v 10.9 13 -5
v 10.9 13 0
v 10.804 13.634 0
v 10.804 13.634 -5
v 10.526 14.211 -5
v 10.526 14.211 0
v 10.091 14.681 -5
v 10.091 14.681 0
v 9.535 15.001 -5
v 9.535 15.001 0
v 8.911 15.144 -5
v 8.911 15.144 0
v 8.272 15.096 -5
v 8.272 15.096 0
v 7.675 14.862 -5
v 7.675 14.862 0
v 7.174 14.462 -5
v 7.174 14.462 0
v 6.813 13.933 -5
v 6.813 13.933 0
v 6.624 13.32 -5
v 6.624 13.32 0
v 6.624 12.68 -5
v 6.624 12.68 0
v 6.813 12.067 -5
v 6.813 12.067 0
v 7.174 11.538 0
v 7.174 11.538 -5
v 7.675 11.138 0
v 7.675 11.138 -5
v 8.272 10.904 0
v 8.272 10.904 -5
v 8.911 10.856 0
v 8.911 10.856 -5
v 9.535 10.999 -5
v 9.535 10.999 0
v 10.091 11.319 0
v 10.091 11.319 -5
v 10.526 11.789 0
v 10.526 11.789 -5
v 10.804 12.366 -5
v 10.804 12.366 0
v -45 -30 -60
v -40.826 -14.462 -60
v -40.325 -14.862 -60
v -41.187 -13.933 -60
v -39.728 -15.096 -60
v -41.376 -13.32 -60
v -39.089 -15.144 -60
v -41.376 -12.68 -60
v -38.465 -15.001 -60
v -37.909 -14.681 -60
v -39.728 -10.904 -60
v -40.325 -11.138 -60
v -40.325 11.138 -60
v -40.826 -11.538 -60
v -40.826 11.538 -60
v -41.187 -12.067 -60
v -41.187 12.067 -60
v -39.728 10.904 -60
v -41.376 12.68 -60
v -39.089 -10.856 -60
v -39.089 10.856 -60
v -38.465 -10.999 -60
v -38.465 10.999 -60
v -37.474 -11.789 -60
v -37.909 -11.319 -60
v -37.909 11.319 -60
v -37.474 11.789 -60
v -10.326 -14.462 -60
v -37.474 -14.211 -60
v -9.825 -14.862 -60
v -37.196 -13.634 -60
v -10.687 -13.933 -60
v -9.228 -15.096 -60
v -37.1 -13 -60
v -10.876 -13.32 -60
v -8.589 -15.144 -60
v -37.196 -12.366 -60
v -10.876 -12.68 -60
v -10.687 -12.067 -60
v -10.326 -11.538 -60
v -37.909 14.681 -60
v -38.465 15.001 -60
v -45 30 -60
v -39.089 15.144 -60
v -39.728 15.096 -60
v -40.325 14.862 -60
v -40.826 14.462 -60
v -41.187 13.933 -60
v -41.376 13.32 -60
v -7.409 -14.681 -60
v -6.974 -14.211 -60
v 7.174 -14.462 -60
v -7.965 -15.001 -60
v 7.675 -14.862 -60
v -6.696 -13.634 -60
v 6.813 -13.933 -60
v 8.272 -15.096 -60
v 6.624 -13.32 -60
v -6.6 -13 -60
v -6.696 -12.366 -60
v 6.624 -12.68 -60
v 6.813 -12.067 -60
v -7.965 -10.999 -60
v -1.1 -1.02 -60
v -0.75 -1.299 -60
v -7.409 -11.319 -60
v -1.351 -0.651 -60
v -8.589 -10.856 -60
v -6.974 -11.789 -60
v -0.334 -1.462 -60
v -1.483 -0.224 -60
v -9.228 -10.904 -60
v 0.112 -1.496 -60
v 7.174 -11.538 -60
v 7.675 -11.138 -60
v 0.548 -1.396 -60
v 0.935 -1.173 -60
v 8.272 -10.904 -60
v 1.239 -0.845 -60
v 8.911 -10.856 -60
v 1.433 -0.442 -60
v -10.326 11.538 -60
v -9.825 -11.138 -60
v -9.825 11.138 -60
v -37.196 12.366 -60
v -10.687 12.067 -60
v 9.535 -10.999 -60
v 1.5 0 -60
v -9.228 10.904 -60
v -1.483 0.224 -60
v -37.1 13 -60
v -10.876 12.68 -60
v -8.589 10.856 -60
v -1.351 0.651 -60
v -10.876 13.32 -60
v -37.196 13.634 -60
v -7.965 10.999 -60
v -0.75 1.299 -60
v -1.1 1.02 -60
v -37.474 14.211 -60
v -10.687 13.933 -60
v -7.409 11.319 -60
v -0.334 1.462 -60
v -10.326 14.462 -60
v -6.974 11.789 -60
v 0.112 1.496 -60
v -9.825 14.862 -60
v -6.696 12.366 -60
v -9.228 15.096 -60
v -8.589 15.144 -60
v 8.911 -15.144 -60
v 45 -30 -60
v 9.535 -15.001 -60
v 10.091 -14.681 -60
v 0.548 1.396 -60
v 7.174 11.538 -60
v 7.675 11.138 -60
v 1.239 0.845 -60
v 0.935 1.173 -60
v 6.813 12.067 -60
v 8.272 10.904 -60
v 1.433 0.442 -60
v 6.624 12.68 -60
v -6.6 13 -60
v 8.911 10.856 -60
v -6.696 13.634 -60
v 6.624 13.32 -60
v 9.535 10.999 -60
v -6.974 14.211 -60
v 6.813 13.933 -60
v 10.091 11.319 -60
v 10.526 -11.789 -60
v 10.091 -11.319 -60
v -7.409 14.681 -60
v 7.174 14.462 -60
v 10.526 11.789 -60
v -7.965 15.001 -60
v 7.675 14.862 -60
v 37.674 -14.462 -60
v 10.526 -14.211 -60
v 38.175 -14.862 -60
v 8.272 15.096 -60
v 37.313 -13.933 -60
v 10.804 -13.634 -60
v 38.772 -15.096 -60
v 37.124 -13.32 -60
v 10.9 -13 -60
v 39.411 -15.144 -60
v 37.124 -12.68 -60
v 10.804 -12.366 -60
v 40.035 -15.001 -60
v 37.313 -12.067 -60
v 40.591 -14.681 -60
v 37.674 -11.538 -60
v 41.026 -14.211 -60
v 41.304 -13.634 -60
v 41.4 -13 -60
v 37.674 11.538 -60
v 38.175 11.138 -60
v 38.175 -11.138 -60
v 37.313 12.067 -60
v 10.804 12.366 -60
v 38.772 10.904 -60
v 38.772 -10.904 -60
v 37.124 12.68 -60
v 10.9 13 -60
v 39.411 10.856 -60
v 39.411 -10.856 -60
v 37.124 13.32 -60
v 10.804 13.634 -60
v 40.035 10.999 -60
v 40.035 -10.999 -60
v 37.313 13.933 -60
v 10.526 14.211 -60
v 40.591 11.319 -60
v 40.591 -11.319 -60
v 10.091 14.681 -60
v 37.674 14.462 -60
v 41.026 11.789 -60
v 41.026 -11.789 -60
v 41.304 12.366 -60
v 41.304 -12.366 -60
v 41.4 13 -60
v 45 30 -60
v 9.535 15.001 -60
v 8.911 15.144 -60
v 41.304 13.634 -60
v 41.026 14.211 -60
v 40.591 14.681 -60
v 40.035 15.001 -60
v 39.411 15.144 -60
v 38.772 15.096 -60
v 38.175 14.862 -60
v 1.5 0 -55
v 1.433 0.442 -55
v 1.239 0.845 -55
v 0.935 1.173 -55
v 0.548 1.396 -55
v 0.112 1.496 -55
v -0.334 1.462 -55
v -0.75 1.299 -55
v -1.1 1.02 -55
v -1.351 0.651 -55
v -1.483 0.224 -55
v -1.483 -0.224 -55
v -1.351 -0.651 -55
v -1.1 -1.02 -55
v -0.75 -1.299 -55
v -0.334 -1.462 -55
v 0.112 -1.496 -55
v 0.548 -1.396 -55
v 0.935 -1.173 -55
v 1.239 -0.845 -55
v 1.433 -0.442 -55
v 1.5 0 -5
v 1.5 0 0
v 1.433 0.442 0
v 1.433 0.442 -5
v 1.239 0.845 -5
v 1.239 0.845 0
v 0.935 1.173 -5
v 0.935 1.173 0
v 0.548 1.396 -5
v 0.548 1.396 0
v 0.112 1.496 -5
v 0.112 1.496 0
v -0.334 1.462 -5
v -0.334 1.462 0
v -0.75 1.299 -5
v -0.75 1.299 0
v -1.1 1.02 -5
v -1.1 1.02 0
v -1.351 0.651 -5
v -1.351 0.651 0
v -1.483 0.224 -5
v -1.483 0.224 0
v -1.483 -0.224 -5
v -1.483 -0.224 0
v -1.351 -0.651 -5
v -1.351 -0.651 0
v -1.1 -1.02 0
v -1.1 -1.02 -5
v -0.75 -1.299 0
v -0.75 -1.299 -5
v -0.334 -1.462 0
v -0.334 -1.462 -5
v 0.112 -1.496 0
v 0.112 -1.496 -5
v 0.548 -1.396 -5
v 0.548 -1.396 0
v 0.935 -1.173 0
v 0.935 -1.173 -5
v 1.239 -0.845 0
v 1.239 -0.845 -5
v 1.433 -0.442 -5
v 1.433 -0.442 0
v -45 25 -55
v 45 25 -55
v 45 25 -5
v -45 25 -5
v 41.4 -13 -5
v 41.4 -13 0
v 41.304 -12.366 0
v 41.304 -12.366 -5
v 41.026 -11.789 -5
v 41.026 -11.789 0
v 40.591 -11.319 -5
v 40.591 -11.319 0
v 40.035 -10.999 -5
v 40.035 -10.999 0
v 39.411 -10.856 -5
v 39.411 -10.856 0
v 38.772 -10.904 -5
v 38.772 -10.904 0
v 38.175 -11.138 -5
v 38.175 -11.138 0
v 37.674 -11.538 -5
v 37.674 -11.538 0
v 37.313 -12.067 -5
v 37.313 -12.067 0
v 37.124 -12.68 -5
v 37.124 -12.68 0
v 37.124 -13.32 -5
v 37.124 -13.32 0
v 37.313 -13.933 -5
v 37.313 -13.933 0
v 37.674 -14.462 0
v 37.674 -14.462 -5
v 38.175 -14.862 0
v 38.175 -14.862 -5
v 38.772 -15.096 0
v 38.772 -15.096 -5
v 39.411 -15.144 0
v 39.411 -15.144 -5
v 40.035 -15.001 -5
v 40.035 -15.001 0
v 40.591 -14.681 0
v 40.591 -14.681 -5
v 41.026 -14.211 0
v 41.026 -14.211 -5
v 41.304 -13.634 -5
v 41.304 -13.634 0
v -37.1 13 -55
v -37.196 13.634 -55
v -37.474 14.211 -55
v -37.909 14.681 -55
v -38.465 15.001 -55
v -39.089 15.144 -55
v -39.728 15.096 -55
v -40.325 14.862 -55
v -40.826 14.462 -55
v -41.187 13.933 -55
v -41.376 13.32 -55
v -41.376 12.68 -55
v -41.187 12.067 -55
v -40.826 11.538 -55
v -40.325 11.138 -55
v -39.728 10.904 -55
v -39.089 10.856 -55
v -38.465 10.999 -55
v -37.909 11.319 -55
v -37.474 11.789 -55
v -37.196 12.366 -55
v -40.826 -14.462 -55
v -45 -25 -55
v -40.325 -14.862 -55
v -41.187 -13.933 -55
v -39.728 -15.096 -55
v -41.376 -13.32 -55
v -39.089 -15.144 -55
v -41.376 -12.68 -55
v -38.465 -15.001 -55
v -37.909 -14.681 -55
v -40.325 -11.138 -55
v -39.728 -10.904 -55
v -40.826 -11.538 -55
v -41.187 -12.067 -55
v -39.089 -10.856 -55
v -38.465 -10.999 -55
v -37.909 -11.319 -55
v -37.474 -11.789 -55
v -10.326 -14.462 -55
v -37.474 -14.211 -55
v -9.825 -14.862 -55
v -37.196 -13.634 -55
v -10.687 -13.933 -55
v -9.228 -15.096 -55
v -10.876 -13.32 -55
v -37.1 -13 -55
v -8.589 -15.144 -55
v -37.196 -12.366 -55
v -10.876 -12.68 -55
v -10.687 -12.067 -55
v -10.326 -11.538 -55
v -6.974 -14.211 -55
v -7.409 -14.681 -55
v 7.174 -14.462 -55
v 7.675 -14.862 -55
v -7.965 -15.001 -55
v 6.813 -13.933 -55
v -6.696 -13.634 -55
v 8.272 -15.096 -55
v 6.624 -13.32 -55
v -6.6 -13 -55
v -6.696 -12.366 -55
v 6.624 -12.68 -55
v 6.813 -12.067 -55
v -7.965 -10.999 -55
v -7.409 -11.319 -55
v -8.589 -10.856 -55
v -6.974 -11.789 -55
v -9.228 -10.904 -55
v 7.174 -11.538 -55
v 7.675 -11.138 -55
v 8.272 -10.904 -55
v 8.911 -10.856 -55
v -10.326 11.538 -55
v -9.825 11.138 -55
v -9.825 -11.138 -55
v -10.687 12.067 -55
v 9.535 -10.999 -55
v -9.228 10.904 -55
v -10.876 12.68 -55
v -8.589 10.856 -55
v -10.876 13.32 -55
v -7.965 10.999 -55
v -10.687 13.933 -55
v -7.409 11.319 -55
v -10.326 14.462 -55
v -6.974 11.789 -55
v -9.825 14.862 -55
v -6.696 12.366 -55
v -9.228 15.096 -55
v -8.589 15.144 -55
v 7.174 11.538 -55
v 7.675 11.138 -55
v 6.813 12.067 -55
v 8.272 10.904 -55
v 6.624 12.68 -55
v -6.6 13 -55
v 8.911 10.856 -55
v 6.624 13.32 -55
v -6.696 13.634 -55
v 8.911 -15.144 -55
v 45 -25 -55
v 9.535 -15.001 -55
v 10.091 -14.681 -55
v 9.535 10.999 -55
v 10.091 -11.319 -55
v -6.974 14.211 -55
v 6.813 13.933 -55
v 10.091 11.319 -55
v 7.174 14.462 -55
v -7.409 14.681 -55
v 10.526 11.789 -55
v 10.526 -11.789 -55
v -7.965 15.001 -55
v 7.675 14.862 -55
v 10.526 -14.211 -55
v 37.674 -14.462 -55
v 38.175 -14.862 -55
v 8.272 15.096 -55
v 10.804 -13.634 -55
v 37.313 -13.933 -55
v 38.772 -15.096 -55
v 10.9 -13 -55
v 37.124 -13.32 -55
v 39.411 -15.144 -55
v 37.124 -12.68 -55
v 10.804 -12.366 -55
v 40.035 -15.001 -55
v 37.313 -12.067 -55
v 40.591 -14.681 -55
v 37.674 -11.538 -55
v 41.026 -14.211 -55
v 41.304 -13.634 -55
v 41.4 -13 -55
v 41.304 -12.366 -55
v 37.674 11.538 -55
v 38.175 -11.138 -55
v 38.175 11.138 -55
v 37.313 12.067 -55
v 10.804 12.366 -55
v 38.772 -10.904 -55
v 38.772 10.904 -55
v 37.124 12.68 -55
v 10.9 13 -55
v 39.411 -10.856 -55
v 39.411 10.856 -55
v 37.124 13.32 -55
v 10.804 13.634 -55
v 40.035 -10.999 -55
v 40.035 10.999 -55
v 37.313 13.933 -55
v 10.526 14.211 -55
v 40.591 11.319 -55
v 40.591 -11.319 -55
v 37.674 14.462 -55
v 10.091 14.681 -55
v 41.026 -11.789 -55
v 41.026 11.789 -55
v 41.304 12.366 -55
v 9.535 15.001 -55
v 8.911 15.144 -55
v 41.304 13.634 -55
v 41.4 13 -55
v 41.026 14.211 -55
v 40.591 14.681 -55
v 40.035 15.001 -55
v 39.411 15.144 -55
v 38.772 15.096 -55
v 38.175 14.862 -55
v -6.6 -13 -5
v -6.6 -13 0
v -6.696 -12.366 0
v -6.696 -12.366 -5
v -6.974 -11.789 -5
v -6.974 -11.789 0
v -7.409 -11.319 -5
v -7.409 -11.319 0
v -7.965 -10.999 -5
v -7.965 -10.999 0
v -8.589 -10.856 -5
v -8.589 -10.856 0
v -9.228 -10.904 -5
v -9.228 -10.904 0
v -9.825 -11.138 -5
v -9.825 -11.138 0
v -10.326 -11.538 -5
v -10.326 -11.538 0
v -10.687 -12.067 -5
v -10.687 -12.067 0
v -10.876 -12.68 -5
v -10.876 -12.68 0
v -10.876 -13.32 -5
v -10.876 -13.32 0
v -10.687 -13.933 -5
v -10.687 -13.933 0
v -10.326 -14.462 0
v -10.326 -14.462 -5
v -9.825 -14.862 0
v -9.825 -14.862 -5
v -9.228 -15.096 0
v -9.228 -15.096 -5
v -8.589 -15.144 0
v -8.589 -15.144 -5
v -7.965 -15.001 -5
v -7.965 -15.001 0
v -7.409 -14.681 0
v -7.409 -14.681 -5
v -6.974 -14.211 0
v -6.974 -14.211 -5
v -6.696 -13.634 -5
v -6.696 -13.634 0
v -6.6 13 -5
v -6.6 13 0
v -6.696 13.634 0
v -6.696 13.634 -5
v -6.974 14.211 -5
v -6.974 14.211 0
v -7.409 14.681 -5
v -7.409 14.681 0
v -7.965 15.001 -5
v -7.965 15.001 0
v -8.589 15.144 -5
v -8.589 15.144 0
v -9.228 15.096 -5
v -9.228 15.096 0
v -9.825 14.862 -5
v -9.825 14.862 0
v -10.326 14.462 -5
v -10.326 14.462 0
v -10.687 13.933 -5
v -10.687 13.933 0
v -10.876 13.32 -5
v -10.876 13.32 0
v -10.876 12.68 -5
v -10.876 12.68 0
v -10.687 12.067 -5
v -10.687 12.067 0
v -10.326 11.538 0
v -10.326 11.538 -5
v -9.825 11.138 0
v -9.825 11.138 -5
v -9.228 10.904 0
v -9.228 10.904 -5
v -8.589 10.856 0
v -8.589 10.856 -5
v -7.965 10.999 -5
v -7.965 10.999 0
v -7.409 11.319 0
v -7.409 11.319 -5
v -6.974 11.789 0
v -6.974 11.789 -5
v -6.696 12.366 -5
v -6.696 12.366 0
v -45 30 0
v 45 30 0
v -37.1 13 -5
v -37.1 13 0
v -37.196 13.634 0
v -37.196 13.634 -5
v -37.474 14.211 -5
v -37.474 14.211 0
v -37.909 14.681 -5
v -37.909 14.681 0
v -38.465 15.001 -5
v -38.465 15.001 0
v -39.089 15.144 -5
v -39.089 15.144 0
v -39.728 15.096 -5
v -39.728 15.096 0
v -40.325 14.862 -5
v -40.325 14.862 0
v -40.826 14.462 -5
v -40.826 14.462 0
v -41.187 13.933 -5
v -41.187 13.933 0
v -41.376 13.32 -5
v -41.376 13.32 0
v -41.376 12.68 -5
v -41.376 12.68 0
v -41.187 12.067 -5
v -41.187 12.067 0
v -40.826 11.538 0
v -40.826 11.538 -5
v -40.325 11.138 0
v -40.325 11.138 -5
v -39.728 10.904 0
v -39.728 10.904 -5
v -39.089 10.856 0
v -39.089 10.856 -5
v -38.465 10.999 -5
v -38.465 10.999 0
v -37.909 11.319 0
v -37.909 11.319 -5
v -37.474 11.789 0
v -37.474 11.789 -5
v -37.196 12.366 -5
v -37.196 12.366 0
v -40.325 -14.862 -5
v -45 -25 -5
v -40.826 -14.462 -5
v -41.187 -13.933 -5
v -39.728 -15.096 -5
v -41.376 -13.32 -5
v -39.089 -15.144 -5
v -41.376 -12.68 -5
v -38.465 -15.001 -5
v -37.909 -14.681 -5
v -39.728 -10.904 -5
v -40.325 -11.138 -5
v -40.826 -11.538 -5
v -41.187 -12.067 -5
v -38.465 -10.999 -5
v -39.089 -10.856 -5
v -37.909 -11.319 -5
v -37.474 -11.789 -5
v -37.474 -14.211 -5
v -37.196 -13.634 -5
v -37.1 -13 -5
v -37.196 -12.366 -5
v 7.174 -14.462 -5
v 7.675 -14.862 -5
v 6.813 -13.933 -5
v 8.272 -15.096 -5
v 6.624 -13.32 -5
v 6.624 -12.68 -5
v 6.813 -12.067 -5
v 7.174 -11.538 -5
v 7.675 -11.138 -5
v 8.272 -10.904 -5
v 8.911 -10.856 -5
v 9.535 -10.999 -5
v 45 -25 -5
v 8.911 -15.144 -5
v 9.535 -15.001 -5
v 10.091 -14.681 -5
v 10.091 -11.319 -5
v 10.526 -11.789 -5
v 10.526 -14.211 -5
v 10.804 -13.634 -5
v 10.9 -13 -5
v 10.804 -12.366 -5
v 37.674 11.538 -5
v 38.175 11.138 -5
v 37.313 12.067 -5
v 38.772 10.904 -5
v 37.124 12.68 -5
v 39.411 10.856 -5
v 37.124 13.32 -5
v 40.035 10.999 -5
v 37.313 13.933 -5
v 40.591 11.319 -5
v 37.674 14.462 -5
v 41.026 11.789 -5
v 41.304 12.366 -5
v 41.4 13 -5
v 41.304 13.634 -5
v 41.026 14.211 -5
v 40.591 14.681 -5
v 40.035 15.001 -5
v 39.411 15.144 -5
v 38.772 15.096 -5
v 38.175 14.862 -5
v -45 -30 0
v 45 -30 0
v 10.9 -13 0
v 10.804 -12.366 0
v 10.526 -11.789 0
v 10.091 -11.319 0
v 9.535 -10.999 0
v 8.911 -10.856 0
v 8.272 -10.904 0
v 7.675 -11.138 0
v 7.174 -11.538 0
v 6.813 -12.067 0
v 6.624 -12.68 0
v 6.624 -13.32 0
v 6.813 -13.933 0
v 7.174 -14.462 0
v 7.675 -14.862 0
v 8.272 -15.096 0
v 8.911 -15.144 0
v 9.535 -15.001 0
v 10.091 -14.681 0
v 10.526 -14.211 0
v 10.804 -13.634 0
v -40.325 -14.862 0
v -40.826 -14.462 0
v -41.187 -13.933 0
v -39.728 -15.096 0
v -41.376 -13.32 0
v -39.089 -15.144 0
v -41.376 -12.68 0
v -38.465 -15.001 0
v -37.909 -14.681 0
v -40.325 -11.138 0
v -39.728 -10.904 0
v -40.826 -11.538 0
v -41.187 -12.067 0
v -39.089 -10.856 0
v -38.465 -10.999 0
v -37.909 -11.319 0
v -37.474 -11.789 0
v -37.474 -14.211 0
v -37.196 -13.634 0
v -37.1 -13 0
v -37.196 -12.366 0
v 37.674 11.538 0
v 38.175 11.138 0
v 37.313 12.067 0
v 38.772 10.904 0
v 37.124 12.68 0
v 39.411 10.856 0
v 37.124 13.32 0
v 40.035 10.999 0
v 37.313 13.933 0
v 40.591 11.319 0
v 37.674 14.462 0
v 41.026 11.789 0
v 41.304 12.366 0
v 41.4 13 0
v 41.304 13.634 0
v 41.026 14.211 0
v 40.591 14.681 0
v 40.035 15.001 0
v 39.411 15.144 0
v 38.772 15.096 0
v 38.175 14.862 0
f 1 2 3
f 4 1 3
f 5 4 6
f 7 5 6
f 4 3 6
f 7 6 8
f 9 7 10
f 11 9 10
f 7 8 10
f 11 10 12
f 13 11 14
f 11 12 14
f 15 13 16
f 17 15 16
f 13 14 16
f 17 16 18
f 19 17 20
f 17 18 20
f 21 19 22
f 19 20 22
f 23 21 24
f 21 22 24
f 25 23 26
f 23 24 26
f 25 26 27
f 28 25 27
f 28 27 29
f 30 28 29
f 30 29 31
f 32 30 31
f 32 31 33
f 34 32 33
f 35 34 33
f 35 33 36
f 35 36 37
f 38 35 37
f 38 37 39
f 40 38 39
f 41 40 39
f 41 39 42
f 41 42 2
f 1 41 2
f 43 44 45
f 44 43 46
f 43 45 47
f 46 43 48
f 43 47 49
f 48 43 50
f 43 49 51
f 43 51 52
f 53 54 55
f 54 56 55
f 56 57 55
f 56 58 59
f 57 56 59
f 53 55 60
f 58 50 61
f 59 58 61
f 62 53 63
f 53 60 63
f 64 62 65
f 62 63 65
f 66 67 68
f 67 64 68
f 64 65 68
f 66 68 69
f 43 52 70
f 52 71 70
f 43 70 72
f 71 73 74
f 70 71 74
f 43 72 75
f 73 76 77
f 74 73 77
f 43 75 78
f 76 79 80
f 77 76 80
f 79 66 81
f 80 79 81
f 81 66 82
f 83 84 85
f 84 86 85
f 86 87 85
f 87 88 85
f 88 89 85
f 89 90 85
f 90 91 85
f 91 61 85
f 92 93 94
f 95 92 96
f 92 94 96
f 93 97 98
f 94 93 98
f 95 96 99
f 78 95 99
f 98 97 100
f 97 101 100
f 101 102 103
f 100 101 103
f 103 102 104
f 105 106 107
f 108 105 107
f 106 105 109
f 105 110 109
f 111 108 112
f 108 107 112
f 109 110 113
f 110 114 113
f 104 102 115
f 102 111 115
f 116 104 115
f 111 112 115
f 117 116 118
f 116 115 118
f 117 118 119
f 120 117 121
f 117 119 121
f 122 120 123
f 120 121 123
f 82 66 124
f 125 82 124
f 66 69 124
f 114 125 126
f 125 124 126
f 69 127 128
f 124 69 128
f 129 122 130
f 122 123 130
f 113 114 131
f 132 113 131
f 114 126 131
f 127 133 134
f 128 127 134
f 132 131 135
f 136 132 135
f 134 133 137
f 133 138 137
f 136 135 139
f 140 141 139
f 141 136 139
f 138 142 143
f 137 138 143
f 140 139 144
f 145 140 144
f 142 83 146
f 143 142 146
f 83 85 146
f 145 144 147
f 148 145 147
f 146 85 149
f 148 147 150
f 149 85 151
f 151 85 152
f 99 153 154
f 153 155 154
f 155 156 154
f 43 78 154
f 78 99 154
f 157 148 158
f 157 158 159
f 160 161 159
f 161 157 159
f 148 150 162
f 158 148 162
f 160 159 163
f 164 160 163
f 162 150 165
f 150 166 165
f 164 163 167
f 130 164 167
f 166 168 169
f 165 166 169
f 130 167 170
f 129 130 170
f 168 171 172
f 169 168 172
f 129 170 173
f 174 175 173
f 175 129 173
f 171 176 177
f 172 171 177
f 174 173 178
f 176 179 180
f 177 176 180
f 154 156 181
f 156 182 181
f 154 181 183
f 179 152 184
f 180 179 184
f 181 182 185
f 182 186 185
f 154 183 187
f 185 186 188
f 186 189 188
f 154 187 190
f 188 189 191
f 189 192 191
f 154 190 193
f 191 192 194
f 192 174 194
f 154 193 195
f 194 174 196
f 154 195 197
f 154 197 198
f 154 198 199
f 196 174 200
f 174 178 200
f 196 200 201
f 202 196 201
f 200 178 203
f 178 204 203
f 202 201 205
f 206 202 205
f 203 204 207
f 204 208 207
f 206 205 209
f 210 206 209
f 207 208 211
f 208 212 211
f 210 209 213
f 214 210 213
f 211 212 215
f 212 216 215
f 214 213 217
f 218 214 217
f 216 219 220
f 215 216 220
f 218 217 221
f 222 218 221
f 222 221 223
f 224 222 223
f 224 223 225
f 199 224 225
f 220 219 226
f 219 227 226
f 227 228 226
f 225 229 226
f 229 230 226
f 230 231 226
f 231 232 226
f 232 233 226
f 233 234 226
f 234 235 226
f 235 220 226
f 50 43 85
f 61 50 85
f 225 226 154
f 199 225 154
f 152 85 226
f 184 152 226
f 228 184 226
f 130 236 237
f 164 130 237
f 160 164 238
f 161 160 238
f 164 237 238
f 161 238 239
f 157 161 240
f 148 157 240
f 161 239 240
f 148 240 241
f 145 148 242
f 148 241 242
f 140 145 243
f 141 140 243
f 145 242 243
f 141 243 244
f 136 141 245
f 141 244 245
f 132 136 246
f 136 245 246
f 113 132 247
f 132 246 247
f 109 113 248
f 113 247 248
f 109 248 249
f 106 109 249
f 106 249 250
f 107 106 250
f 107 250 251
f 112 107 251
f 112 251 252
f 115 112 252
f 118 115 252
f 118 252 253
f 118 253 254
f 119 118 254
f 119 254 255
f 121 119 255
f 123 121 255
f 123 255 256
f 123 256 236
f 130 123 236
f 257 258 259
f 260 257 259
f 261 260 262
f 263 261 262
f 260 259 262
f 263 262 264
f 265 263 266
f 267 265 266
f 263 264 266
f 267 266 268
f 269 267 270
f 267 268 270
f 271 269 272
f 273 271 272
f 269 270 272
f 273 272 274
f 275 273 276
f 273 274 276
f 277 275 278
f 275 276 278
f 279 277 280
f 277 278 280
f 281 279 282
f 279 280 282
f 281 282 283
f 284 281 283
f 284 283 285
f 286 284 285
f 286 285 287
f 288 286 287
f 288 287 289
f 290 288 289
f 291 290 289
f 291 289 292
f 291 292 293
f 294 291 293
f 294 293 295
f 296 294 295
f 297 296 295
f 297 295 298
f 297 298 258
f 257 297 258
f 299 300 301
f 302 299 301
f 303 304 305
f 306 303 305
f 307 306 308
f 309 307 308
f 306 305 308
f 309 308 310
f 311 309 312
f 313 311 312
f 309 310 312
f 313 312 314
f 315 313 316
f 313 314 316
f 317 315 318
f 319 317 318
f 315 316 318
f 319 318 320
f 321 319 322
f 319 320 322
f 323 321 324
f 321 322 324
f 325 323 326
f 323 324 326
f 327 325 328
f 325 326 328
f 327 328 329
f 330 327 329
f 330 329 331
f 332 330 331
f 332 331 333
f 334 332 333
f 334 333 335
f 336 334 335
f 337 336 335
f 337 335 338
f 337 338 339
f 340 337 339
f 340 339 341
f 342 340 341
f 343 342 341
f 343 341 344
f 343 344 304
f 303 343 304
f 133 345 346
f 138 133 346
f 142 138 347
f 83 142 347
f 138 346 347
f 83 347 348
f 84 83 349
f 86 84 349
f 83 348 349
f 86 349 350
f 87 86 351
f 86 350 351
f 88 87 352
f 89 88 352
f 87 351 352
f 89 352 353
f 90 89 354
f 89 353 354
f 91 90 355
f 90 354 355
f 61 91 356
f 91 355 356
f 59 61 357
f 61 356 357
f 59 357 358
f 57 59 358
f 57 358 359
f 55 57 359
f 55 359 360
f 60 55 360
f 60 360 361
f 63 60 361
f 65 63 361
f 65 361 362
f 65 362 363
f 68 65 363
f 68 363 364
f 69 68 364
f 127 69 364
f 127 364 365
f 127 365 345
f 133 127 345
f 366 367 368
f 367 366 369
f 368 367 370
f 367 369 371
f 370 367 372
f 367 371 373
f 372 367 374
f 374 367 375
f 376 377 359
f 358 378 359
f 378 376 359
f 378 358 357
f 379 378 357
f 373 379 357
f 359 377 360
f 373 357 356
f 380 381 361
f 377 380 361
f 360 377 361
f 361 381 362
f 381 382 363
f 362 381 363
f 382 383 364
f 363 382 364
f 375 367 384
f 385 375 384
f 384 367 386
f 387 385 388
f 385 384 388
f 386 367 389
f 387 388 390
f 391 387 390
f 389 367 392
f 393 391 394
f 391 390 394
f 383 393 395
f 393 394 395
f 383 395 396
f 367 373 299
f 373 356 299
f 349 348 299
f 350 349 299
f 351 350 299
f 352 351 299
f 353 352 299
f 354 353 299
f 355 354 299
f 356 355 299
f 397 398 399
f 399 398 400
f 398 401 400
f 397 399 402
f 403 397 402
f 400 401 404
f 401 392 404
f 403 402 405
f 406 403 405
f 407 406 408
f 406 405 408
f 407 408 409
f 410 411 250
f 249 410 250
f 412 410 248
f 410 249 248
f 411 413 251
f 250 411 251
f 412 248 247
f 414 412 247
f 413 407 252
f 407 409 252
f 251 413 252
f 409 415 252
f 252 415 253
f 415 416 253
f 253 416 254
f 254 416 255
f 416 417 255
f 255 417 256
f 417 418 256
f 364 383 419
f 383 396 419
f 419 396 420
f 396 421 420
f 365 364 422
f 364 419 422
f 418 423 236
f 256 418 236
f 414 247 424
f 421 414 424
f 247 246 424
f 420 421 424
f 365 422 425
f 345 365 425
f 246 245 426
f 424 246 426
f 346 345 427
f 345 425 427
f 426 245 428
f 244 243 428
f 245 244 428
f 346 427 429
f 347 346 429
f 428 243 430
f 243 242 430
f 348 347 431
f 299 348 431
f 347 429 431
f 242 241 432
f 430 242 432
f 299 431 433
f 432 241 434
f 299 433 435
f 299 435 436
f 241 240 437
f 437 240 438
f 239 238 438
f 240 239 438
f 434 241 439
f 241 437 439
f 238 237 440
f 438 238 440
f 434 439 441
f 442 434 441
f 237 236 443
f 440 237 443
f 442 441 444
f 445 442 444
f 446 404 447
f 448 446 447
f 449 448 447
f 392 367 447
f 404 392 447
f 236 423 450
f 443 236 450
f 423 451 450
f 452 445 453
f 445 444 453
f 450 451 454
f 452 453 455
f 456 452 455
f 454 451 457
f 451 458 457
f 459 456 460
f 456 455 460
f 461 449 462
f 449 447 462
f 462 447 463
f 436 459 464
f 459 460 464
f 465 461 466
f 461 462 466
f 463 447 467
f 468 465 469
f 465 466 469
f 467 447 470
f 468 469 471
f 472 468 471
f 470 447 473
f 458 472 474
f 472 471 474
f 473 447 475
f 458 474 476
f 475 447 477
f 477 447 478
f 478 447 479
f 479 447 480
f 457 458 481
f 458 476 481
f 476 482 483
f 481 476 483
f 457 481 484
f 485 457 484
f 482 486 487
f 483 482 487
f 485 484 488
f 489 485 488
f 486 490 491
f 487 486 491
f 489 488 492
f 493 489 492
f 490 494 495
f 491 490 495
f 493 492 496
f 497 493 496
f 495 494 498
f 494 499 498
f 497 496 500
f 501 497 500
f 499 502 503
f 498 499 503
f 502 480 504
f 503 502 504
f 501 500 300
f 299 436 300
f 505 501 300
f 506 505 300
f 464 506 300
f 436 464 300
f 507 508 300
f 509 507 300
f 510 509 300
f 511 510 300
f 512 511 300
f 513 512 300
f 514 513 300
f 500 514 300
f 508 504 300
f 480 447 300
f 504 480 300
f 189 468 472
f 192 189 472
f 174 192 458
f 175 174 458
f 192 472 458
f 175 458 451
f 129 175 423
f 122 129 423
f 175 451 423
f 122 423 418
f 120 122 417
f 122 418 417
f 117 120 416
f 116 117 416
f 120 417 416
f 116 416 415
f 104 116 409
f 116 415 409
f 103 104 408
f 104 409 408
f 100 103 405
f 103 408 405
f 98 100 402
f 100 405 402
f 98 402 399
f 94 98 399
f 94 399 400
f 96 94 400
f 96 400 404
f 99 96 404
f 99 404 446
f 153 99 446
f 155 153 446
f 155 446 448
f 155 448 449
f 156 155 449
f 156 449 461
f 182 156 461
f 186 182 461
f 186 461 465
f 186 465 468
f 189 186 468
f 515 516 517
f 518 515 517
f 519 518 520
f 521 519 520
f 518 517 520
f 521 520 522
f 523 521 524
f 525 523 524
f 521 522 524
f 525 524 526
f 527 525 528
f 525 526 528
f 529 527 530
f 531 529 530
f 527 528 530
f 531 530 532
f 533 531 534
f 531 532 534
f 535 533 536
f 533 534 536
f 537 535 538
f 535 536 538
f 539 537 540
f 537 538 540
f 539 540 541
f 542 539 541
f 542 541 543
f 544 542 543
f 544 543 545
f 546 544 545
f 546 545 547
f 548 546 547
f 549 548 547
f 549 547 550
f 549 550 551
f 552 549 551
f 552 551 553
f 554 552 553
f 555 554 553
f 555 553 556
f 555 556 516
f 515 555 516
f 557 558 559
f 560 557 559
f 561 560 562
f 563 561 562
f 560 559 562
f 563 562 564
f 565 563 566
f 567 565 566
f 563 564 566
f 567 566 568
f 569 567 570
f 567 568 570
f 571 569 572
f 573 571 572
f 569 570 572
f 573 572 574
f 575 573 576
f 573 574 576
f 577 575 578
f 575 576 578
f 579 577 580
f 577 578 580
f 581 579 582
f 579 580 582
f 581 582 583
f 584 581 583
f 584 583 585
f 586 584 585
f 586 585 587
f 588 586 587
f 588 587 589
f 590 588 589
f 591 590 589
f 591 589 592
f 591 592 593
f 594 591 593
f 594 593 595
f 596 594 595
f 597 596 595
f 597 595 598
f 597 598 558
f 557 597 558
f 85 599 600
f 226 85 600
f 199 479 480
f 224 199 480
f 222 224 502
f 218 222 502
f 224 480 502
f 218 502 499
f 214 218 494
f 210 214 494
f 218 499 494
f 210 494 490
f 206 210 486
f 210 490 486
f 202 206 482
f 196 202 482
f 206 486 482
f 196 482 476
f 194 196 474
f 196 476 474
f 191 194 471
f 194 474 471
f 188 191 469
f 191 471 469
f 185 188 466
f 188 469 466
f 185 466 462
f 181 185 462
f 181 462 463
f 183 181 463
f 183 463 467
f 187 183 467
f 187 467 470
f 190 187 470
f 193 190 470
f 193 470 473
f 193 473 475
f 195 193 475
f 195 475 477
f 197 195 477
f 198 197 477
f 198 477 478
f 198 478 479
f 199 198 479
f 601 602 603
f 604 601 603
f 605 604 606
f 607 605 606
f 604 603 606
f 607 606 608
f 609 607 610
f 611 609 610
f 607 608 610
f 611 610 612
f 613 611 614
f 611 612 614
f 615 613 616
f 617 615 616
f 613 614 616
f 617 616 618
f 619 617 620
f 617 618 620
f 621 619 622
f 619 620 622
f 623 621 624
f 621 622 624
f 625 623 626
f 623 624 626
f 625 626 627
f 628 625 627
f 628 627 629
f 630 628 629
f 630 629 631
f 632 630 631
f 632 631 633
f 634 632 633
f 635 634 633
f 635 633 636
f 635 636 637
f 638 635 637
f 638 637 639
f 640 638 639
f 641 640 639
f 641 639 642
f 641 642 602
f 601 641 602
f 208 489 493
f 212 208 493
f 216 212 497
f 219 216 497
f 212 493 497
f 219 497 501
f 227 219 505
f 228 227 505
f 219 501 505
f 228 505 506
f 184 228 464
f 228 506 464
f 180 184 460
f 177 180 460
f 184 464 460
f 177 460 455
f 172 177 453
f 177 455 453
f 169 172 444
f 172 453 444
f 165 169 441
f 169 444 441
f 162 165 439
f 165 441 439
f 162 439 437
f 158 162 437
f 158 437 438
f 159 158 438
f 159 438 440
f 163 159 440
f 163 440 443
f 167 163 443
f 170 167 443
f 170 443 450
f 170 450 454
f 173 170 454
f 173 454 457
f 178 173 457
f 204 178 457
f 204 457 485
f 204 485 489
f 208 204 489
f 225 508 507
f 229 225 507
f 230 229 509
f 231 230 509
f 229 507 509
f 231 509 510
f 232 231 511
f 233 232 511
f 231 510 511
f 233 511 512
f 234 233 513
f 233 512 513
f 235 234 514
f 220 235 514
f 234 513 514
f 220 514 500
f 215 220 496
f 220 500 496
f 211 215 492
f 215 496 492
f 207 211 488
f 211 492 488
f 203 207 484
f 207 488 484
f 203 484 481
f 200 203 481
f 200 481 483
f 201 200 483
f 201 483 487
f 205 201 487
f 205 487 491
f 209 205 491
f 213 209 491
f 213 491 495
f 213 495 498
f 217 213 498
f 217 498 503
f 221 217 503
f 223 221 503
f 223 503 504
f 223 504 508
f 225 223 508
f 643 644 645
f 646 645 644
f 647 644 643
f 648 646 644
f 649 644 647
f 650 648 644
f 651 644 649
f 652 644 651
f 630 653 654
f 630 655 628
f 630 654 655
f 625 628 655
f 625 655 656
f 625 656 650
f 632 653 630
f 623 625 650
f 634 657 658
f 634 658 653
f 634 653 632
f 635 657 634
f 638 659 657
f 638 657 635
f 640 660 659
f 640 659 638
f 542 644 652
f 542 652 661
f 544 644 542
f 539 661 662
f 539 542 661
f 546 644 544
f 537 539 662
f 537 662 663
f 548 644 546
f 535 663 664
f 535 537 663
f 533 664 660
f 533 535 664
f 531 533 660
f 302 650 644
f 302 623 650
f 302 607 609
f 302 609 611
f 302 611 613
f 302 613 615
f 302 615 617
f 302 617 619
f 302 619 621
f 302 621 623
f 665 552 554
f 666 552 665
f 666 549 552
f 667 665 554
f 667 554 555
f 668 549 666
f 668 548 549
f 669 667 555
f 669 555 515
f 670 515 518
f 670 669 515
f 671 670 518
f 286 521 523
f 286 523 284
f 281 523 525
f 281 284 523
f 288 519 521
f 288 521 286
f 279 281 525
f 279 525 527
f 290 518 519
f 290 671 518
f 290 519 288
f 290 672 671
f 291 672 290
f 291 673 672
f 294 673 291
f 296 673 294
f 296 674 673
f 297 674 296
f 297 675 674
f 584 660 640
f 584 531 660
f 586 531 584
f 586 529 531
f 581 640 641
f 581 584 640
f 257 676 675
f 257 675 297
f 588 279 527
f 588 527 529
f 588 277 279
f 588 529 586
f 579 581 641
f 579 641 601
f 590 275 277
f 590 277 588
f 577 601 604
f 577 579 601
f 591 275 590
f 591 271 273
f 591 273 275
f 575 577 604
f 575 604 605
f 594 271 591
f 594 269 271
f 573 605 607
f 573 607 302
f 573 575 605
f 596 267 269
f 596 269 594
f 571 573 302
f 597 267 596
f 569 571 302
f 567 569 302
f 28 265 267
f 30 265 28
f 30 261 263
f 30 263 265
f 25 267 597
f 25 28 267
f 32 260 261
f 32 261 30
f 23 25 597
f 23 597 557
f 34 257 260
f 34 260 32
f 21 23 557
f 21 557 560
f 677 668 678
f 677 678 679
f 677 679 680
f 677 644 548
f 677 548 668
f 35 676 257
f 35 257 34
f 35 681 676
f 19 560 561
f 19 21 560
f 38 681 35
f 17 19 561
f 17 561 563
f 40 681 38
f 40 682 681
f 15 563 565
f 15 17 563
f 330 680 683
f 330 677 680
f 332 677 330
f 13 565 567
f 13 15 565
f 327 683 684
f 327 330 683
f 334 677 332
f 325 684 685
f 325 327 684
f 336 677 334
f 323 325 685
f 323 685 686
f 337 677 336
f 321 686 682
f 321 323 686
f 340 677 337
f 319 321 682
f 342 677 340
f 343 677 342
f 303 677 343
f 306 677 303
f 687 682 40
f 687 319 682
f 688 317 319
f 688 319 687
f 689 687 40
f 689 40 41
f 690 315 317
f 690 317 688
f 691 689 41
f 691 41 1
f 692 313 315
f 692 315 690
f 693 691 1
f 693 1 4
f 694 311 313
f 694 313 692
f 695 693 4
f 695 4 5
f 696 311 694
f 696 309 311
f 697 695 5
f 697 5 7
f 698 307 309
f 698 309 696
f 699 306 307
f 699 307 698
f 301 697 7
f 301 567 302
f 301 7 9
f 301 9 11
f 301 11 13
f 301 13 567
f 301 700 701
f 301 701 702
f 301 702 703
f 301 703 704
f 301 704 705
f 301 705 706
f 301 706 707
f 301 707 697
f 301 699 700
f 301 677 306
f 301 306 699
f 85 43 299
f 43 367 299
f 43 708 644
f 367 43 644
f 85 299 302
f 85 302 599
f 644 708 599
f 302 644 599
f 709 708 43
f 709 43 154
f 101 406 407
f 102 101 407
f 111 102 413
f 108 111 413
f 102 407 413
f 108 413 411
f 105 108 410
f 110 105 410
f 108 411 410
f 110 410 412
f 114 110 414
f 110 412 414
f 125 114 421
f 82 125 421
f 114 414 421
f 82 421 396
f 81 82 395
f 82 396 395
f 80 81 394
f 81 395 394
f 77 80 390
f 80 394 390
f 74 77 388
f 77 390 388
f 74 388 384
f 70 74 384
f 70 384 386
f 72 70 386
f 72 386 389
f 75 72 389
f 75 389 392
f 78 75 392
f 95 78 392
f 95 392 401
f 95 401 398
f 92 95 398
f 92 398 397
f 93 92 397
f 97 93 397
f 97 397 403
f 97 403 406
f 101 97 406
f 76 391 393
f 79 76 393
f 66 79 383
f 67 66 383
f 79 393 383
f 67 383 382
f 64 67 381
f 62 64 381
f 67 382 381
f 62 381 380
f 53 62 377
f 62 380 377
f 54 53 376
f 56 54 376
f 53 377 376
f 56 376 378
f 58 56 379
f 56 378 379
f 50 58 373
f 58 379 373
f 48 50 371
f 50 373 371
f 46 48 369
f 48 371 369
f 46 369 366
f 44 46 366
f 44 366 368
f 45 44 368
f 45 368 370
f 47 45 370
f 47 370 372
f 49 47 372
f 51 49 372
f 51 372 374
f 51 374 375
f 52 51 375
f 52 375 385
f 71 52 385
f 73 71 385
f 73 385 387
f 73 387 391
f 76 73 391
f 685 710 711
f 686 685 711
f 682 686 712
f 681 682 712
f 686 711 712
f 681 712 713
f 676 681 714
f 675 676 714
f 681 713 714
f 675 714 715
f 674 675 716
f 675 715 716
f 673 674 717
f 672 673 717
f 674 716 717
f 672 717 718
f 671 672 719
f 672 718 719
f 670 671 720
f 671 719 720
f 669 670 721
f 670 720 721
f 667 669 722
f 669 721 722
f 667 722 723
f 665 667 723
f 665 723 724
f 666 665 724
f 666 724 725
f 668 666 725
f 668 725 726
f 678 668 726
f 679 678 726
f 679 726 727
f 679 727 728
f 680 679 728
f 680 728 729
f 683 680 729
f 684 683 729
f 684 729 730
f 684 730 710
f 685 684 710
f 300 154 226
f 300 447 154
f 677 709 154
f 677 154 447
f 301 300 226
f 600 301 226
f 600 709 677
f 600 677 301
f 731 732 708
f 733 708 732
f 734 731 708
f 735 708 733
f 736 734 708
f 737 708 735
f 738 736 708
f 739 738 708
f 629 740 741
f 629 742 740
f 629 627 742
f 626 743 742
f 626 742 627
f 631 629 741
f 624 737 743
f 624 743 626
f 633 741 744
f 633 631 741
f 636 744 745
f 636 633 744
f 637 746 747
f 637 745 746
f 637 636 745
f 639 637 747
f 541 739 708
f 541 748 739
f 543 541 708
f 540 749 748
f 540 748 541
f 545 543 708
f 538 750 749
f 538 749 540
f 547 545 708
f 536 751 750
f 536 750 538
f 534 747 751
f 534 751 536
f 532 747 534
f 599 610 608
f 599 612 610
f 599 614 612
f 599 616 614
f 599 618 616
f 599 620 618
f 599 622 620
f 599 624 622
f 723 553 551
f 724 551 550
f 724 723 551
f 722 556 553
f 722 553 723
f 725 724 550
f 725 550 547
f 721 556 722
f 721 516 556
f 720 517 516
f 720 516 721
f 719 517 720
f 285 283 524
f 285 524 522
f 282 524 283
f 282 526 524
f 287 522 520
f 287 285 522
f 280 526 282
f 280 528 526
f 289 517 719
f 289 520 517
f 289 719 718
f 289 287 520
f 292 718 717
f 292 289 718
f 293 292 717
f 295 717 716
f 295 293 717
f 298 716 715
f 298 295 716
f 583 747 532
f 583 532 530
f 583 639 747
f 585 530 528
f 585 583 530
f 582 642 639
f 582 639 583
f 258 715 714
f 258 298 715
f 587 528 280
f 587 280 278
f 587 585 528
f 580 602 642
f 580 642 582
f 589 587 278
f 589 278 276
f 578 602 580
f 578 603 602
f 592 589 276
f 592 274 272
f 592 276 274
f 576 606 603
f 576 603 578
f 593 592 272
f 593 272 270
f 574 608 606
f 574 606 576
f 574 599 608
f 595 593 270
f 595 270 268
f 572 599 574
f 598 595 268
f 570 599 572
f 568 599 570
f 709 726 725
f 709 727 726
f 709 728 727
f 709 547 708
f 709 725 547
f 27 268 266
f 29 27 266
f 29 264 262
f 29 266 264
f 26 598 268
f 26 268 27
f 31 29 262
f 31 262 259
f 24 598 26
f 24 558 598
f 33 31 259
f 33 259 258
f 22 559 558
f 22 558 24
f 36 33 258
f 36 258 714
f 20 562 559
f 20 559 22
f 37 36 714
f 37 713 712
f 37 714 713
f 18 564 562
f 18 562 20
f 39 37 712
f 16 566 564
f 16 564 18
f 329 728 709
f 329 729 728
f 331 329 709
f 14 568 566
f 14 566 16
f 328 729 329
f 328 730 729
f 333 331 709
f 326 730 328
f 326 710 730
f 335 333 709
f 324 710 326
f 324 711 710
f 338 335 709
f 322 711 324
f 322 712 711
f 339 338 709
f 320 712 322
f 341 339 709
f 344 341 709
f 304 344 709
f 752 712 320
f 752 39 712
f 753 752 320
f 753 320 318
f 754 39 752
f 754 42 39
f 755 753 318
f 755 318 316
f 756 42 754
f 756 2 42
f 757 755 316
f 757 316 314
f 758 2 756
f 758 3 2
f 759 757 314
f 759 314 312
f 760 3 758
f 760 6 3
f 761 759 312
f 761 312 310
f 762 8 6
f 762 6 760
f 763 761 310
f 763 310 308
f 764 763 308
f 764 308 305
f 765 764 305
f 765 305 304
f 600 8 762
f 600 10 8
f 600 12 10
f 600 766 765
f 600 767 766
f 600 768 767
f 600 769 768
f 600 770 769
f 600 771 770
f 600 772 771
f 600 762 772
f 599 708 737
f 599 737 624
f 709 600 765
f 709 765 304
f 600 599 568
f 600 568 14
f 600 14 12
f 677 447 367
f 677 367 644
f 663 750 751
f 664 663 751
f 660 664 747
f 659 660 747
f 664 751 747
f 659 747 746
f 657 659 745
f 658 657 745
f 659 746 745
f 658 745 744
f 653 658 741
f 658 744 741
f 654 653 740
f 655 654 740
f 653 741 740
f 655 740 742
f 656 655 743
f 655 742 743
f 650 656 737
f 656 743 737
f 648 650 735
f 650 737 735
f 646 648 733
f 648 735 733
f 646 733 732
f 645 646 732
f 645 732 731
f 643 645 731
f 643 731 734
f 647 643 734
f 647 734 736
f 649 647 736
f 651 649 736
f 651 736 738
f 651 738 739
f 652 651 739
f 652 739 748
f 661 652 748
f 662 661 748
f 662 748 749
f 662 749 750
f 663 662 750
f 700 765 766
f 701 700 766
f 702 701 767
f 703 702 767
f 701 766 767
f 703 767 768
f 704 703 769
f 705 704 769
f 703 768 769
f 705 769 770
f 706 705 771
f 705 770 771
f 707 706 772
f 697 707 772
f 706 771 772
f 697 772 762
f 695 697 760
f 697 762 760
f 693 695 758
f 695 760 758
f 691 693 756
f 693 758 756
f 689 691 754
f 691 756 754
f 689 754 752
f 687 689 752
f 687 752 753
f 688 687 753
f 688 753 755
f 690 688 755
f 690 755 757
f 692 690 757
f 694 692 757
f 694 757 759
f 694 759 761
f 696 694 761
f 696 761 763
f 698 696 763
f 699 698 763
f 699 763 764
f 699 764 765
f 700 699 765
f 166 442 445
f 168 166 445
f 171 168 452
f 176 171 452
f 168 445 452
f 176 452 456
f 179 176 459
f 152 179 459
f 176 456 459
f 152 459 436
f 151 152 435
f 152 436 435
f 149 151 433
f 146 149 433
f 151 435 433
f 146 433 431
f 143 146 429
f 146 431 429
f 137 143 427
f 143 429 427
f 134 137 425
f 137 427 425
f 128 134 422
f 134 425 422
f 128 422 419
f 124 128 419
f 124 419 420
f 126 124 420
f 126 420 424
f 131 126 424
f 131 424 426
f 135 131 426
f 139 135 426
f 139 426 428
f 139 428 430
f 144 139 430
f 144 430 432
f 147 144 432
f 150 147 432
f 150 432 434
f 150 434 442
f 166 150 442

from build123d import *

# Parameters (mm, degrees)
F0_W     = 90
F0_H     = 60
F0_R     = 2.15
F1_DEPTH = 60
F2_R     = 1.5
F3_DEPTH = 60
F4_W     = 50
F4_H     = 50
F5_DEPTH = 90


with BuildPart() as f1:
    # F0 (on Top) → F1 (new body)
    with BuildSketch(Plane.XY):
        Rectangle(F0_W, F0_H)
        with Locations((-39.25, -13)):
            Circle(F0_R, mode=Mode.SUBTRACT)
        with Locations((-8.75, -13)):
            Circle(F0_R, mode=Mode.SUBTRACT)
        with Locations((8.75, -13)):
            Circle(F0_R, mode=Mode.SUBTRACT)
        with Locations((39.25, -13)):
            Circle(F0_R, mode=Mode.SUBTRACT)
        with Locations((-39.25, 13)):
            Circle(F0_R, mode=Mode.SUBTRACT)
        with Locations((-8.75, 13)):
            Circle(F0_R, mode=Mode.SUBTRACT)
        with Locations((8.75, 13)):
            Circle(F0_R, mode=Mode.SUBTRACT)
        with Locations((39.25, 13)):
            Circle(F0_R, mode=Mode.SUBTRACT)
    extrude(amount=-F1_DEPTH)

    # F2 (on face) → F3 (cut)
    with BuildSketch(Plane.XY):
        Circle(F2_R)
    extrude(amount=-F3_DEPTH, mode=Mode.SUBTRACT)

    # F4 (on face) → F5 (cut)
    with BuildSketch(Plane.YZ.offset(45)):
        with Locations((0, -30)):
            Rectangle(F4_W, F4_H)
    extrude(amount=-F5_DEPTH, mode=Mode.SUBTRACT)


solid = f1.part
